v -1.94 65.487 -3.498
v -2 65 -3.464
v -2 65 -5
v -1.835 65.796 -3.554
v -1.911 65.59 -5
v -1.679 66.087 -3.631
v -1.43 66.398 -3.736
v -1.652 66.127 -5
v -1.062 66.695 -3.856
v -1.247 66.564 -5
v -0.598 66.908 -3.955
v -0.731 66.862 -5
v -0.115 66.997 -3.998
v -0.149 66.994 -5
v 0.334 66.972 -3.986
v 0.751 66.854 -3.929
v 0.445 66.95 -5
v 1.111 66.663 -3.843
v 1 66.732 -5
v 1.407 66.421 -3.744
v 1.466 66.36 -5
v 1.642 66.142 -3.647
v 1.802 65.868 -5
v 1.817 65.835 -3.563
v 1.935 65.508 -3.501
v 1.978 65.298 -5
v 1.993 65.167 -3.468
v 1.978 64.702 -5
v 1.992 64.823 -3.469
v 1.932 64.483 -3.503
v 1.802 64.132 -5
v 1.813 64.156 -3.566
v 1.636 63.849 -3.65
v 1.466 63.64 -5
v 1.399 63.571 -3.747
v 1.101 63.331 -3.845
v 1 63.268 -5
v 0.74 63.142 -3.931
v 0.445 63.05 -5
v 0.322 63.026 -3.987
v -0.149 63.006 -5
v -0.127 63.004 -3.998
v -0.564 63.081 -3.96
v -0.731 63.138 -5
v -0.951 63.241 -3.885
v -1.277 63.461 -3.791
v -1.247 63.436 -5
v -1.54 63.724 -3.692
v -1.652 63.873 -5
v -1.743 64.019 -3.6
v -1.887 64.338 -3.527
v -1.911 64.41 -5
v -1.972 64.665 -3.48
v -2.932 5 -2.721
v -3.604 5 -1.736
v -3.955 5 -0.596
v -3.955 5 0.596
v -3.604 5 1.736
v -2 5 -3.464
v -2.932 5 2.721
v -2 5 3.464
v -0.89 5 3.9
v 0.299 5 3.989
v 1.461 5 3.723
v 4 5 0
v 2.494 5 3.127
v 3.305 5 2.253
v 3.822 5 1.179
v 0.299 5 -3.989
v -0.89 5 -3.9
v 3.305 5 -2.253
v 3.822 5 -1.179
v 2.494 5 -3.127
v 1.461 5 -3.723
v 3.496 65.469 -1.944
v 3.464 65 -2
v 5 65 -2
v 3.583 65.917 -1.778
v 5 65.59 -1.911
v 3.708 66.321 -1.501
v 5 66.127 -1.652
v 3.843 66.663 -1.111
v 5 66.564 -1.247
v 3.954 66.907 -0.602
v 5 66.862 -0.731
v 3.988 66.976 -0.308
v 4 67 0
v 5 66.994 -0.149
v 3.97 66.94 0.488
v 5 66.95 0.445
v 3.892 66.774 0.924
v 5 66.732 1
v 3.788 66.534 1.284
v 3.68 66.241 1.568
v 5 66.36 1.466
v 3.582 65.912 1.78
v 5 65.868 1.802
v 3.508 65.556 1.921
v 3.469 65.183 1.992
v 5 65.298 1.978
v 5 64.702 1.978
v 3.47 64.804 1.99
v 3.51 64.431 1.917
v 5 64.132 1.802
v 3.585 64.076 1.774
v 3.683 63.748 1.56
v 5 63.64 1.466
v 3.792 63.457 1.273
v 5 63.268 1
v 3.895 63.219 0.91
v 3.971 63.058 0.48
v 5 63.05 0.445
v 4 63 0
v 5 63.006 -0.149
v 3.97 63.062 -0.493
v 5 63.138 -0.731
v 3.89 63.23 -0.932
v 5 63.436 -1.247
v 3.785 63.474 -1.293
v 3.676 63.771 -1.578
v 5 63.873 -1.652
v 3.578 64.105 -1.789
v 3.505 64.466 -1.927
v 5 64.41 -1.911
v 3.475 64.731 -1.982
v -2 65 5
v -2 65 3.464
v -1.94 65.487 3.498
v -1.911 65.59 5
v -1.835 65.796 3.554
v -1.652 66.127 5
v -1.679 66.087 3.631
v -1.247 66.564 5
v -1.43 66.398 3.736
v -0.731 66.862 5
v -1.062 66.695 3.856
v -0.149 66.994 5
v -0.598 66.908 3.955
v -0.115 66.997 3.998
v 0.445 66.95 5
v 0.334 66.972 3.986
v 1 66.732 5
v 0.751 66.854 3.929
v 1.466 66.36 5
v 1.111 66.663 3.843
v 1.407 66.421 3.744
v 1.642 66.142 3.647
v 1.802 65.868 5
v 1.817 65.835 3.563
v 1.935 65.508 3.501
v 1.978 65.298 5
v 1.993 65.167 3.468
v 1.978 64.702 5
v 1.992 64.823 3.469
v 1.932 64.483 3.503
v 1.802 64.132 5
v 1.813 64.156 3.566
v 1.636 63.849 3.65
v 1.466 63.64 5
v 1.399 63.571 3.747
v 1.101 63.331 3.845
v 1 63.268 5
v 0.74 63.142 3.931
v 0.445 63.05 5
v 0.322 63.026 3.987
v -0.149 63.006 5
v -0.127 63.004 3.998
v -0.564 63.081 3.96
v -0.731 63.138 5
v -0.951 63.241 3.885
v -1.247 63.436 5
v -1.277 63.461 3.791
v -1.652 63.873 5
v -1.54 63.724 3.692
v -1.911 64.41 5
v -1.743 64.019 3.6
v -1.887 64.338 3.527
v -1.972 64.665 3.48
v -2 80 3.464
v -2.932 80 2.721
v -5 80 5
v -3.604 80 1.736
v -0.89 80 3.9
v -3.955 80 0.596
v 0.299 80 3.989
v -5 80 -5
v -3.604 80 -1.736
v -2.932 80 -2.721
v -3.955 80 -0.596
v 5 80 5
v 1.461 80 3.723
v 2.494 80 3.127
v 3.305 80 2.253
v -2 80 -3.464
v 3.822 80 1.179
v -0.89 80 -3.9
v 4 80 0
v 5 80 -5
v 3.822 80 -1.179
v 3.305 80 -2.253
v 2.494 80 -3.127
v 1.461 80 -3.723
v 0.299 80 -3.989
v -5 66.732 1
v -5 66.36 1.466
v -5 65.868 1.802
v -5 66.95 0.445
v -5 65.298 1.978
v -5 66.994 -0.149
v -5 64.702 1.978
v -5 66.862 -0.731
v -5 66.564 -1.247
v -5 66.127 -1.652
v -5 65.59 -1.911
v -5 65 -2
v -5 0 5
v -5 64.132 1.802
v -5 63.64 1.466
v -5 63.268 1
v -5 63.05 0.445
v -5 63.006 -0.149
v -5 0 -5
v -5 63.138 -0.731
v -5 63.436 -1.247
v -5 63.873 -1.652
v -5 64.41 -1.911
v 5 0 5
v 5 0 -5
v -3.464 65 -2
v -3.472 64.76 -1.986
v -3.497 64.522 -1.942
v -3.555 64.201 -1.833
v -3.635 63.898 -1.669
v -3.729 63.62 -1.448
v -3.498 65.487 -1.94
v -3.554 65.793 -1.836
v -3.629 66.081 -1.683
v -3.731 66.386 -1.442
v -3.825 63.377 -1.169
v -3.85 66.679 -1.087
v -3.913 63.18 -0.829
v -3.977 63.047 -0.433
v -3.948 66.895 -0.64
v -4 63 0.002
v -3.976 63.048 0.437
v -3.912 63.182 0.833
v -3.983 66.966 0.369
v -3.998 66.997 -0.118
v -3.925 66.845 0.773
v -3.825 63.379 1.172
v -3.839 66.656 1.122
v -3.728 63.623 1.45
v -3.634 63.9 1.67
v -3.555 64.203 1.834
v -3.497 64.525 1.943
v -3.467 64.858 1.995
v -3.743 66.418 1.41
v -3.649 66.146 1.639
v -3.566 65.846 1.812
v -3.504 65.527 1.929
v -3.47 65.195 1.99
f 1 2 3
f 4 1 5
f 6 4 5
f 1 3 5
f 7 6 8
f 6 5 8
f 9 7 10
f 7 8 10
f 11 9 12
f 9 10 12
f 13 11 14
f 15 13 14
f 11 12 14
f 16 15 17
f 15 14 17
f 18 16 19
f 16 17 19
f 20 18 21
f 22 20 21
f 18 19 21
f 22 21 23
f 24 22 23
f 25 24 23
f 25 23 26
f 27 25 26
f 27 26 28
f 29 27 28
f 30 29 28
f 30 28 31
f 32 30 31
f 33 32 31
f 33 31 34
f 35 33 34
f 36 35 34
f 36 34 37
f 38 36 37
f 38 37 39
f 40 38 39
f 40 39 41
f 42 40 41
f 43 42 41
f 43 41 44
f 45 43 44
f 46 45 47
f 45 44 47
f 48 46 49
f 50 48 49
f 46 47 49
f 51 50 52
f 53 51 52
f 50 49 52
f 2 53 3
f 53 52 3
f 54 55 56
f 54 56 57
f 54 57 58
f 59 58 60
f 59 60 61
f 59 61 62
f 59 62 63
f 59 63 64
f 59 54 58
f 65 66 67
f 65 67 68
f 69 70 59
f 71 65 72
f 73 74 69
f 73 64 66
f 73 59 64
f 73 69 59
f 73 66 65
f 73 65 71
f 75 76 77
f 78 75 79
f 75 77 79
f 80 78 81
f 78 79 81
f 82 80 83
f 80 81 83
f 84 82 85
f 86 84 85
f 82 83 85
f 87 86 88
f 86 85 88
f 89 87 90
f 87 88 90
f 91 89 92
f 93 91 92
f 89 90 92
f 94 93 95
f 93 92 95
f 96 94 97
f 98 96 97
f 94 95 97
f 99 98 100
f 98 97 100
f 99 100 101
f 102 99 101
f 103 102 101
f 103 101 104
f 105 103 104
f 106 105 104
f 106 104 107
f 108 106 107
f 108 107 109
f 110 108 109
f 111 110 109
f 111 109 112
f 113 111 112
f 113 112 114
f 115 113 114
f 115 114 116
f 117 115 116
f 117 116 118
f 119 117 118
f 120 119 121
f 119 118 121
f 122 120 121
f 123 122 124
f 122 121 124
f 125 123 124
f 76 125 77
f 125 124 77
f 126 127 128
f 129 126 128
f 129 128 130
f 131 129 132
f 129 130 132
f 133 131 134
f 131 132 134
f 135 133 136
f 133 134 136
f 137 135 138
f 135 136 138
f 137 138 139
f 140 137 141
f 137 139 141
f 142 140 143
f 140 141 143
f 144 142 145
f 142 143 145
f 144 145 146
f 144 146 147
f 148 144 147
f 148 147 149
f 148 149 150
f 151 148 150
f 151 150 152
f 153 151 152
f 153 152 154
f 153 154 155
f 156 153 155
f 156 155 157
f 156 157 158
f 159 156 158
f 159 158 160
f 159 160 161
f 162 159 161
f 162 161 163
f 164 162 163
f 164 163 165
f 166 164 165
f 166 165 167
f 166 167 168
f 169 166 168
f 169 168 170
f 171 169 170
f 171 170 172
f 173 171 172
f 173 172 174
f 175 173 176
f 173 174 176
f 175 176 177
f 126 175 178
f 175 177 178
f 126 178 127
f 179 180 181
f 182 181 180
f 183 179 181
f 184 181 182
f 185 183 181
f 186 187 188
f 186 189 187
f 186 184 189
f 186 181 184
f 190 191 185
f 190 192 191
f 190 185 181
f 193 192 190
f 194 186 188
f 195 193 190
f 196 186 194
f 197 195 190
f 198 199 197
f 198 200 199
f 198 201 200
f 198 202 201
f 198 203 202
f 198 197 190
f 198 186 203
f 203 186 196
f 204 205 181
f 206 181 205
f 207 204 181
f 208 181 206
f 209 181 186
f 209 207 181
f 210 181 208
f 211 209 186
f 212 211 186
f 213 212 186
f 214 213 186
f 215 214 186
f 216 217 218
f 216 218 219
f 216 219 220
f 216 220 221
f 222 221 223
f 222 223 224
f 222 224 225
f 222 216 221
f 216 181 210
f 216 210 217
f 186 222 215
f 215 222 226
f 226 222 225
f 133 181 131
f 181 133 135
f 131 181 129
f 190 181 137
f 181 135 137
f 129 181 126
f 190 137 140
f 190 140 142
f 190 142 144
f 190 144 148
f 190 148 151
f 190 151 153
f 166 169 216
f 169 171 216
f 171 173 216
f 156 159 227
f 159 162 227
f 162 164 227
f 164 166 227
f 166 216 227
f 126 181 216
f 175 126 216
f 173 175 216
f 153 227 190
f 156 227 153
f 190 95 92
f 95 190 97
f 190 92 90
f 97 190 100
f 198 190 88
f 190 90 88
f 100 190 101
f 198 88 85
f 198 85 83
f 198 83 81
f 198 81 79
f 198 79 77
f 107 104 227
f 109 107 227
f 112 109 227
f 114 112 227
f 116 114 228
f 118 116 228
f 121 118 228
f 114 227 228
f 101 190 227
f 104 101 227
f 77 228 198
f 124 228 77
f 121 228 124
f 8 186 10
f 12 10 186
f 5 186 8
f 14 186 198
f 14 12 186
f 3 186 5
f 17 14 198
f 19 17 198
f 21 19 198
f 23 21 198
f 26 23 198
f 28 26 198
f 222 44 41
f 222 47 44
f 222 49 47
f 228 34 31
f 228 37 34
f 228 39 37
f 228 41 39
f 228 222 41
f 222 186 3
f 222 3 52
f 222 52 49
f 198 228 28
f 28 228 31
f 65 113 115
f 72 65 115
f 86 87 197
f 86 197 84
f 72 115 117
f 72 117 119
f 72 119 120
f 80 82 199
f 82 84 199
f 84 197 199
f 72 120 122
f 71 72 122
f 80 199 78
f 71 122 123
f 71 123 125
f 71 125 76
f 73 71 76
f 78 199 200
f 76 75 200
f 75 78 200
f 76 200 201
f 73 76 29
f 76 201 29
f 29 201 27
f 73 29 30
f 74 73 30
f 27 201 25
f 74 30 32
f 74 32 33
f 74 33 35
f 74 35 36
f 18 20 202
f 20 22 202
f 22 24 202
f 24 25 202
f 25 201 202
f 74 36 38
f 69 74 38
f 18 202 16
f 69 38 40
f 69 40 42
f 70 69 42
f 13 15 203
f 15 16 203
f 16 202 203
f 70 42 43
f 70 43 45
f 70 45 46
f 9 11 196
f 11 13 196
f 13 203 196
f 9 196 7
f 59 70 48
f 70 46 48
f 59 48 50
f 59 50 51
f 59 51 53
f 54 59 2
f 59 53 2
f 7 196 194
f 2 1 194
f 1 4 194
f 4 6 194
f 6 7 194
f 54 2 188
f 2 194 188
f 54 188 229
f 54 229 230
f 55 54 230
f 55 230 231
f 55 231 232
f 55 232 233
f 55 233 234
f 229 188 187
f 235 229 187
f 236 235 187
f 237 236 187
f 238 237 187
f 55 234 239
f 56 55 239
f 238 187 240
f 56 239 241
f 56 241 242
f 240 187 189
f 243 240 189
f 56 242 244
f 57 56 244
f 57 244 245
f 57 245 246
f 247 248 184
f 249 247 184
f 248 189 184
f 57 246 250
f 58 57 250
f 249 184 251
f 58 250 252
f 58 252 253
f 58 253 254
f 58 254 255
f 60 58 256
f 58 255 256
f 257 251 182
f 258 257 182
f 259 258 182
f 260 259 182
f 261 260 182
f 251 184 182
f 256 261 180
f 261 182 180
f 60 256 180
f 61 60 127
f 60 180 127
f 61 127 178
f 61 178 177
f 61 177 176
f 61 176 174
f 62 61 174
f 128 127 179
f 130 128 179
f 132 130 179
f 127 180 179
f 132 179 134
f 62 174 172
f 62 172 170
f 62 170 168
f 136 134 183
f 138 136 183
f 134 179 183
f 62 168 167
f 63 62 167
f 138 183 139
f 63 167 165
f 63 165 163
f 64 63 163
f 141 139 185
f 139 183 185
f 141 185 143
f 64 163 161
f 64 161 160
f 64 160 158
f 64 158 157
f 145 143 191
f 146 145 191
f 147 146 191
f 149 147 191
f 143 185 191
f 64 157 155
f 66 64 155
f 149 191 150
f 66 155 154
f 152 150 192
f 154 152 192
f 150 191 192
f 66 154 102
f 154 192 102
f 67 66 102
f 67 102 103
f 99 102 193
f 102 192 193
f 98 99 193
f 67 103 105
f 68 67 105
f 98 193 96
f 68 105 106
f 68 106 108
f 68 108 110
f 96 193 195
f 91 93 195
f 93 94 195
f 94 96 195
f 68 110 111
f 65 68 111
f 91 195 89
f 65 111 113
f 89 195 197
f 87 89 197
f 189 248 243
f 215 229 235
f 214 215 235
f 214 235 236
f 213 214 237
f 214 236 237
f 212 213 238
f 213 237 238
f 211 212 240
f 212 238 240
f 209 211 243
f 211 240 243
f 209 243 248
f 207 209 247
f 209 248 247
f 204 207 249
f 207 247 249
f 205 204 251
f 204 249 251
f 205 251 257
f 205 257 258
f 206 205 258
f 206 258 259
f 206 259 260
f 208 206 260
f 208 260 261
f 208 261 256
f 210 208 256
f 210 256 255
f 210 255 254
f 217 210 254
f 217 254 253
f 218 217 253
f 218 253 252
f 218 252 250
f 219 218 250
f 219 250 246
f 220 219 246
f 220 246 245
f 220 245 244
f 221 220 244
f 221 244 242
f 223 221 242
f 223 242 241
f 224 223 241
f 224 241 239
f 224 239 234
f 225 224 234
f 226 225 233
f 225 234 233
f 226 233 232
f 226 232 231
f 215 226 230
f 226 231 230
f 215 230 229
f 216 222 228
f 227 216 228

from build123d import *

# Parameters (mm, degrees)
SKETCH_1_W          = 10
SKETCH_1_H          = 10
EXTRUDE_1_DEPTH     = 80
SKETCH_4_R          = 4
CUT_EXTRUDE_3_DEPTH = 75
SKETCH_5_R          = 2
CUT_EXTRUDE_4_DEPTH = 11
SKETCH_6_R          = 2
CUT_EXTRUDE_5_DEPTH = 10


with BuildPart() as part:
    # 草图1 → 凸台-拉伸1 (new body)
    with BuildSketch(Plane(origin=(0, 0, 0), x_dir=(1, 0, 0), z_dir=(0, 1, 0))):
        Rectangle(SKETCH_1_W, SKETCH_1_H)
    extrude(amount=EXTRUDE_1_DEPTH)

    # 草图4 → 切除-拉伸3 (cut)
    with BuildSketch(Plane(origin=(0, 80, 0), x_dir=(1, 0, 0), z_dir=(0, 1, 0))):
        Circle(SKETCH_4_R)
    extrude(amount=-CUT_EXTRUDE_3_DEPTH, mode=Mode.SUBTRACT)

    # 草图5 → 切除-拉伸4 (cut, through all)
    with BuildSketch(Plane(origin=(5, 0, 0), x_dir=(0, 0, -1), z_dir=(1, 0, 0))):
        with Locations((0, 65)):
            Circle(SKETCH_5_R)
    extrude(amount=-CUT_EXTRUDE_4_DEPTH, mode=Mode.SUBTRACT)

    # 草图6 → 切除-拉伸5 (cut)
    with BuildSketch(Plane(origin=(0, 0, -5), x_dir=(-1, 0, 0), z_dir=(0, 0, -1))):
        with Locations((0, 65)):
            Circle(SKETCH_6_R)
    extrude(amount=-CUT_EXTRUDE_5_DEPTH, mode=Mode.SUBTRACT)


solid = part.part
